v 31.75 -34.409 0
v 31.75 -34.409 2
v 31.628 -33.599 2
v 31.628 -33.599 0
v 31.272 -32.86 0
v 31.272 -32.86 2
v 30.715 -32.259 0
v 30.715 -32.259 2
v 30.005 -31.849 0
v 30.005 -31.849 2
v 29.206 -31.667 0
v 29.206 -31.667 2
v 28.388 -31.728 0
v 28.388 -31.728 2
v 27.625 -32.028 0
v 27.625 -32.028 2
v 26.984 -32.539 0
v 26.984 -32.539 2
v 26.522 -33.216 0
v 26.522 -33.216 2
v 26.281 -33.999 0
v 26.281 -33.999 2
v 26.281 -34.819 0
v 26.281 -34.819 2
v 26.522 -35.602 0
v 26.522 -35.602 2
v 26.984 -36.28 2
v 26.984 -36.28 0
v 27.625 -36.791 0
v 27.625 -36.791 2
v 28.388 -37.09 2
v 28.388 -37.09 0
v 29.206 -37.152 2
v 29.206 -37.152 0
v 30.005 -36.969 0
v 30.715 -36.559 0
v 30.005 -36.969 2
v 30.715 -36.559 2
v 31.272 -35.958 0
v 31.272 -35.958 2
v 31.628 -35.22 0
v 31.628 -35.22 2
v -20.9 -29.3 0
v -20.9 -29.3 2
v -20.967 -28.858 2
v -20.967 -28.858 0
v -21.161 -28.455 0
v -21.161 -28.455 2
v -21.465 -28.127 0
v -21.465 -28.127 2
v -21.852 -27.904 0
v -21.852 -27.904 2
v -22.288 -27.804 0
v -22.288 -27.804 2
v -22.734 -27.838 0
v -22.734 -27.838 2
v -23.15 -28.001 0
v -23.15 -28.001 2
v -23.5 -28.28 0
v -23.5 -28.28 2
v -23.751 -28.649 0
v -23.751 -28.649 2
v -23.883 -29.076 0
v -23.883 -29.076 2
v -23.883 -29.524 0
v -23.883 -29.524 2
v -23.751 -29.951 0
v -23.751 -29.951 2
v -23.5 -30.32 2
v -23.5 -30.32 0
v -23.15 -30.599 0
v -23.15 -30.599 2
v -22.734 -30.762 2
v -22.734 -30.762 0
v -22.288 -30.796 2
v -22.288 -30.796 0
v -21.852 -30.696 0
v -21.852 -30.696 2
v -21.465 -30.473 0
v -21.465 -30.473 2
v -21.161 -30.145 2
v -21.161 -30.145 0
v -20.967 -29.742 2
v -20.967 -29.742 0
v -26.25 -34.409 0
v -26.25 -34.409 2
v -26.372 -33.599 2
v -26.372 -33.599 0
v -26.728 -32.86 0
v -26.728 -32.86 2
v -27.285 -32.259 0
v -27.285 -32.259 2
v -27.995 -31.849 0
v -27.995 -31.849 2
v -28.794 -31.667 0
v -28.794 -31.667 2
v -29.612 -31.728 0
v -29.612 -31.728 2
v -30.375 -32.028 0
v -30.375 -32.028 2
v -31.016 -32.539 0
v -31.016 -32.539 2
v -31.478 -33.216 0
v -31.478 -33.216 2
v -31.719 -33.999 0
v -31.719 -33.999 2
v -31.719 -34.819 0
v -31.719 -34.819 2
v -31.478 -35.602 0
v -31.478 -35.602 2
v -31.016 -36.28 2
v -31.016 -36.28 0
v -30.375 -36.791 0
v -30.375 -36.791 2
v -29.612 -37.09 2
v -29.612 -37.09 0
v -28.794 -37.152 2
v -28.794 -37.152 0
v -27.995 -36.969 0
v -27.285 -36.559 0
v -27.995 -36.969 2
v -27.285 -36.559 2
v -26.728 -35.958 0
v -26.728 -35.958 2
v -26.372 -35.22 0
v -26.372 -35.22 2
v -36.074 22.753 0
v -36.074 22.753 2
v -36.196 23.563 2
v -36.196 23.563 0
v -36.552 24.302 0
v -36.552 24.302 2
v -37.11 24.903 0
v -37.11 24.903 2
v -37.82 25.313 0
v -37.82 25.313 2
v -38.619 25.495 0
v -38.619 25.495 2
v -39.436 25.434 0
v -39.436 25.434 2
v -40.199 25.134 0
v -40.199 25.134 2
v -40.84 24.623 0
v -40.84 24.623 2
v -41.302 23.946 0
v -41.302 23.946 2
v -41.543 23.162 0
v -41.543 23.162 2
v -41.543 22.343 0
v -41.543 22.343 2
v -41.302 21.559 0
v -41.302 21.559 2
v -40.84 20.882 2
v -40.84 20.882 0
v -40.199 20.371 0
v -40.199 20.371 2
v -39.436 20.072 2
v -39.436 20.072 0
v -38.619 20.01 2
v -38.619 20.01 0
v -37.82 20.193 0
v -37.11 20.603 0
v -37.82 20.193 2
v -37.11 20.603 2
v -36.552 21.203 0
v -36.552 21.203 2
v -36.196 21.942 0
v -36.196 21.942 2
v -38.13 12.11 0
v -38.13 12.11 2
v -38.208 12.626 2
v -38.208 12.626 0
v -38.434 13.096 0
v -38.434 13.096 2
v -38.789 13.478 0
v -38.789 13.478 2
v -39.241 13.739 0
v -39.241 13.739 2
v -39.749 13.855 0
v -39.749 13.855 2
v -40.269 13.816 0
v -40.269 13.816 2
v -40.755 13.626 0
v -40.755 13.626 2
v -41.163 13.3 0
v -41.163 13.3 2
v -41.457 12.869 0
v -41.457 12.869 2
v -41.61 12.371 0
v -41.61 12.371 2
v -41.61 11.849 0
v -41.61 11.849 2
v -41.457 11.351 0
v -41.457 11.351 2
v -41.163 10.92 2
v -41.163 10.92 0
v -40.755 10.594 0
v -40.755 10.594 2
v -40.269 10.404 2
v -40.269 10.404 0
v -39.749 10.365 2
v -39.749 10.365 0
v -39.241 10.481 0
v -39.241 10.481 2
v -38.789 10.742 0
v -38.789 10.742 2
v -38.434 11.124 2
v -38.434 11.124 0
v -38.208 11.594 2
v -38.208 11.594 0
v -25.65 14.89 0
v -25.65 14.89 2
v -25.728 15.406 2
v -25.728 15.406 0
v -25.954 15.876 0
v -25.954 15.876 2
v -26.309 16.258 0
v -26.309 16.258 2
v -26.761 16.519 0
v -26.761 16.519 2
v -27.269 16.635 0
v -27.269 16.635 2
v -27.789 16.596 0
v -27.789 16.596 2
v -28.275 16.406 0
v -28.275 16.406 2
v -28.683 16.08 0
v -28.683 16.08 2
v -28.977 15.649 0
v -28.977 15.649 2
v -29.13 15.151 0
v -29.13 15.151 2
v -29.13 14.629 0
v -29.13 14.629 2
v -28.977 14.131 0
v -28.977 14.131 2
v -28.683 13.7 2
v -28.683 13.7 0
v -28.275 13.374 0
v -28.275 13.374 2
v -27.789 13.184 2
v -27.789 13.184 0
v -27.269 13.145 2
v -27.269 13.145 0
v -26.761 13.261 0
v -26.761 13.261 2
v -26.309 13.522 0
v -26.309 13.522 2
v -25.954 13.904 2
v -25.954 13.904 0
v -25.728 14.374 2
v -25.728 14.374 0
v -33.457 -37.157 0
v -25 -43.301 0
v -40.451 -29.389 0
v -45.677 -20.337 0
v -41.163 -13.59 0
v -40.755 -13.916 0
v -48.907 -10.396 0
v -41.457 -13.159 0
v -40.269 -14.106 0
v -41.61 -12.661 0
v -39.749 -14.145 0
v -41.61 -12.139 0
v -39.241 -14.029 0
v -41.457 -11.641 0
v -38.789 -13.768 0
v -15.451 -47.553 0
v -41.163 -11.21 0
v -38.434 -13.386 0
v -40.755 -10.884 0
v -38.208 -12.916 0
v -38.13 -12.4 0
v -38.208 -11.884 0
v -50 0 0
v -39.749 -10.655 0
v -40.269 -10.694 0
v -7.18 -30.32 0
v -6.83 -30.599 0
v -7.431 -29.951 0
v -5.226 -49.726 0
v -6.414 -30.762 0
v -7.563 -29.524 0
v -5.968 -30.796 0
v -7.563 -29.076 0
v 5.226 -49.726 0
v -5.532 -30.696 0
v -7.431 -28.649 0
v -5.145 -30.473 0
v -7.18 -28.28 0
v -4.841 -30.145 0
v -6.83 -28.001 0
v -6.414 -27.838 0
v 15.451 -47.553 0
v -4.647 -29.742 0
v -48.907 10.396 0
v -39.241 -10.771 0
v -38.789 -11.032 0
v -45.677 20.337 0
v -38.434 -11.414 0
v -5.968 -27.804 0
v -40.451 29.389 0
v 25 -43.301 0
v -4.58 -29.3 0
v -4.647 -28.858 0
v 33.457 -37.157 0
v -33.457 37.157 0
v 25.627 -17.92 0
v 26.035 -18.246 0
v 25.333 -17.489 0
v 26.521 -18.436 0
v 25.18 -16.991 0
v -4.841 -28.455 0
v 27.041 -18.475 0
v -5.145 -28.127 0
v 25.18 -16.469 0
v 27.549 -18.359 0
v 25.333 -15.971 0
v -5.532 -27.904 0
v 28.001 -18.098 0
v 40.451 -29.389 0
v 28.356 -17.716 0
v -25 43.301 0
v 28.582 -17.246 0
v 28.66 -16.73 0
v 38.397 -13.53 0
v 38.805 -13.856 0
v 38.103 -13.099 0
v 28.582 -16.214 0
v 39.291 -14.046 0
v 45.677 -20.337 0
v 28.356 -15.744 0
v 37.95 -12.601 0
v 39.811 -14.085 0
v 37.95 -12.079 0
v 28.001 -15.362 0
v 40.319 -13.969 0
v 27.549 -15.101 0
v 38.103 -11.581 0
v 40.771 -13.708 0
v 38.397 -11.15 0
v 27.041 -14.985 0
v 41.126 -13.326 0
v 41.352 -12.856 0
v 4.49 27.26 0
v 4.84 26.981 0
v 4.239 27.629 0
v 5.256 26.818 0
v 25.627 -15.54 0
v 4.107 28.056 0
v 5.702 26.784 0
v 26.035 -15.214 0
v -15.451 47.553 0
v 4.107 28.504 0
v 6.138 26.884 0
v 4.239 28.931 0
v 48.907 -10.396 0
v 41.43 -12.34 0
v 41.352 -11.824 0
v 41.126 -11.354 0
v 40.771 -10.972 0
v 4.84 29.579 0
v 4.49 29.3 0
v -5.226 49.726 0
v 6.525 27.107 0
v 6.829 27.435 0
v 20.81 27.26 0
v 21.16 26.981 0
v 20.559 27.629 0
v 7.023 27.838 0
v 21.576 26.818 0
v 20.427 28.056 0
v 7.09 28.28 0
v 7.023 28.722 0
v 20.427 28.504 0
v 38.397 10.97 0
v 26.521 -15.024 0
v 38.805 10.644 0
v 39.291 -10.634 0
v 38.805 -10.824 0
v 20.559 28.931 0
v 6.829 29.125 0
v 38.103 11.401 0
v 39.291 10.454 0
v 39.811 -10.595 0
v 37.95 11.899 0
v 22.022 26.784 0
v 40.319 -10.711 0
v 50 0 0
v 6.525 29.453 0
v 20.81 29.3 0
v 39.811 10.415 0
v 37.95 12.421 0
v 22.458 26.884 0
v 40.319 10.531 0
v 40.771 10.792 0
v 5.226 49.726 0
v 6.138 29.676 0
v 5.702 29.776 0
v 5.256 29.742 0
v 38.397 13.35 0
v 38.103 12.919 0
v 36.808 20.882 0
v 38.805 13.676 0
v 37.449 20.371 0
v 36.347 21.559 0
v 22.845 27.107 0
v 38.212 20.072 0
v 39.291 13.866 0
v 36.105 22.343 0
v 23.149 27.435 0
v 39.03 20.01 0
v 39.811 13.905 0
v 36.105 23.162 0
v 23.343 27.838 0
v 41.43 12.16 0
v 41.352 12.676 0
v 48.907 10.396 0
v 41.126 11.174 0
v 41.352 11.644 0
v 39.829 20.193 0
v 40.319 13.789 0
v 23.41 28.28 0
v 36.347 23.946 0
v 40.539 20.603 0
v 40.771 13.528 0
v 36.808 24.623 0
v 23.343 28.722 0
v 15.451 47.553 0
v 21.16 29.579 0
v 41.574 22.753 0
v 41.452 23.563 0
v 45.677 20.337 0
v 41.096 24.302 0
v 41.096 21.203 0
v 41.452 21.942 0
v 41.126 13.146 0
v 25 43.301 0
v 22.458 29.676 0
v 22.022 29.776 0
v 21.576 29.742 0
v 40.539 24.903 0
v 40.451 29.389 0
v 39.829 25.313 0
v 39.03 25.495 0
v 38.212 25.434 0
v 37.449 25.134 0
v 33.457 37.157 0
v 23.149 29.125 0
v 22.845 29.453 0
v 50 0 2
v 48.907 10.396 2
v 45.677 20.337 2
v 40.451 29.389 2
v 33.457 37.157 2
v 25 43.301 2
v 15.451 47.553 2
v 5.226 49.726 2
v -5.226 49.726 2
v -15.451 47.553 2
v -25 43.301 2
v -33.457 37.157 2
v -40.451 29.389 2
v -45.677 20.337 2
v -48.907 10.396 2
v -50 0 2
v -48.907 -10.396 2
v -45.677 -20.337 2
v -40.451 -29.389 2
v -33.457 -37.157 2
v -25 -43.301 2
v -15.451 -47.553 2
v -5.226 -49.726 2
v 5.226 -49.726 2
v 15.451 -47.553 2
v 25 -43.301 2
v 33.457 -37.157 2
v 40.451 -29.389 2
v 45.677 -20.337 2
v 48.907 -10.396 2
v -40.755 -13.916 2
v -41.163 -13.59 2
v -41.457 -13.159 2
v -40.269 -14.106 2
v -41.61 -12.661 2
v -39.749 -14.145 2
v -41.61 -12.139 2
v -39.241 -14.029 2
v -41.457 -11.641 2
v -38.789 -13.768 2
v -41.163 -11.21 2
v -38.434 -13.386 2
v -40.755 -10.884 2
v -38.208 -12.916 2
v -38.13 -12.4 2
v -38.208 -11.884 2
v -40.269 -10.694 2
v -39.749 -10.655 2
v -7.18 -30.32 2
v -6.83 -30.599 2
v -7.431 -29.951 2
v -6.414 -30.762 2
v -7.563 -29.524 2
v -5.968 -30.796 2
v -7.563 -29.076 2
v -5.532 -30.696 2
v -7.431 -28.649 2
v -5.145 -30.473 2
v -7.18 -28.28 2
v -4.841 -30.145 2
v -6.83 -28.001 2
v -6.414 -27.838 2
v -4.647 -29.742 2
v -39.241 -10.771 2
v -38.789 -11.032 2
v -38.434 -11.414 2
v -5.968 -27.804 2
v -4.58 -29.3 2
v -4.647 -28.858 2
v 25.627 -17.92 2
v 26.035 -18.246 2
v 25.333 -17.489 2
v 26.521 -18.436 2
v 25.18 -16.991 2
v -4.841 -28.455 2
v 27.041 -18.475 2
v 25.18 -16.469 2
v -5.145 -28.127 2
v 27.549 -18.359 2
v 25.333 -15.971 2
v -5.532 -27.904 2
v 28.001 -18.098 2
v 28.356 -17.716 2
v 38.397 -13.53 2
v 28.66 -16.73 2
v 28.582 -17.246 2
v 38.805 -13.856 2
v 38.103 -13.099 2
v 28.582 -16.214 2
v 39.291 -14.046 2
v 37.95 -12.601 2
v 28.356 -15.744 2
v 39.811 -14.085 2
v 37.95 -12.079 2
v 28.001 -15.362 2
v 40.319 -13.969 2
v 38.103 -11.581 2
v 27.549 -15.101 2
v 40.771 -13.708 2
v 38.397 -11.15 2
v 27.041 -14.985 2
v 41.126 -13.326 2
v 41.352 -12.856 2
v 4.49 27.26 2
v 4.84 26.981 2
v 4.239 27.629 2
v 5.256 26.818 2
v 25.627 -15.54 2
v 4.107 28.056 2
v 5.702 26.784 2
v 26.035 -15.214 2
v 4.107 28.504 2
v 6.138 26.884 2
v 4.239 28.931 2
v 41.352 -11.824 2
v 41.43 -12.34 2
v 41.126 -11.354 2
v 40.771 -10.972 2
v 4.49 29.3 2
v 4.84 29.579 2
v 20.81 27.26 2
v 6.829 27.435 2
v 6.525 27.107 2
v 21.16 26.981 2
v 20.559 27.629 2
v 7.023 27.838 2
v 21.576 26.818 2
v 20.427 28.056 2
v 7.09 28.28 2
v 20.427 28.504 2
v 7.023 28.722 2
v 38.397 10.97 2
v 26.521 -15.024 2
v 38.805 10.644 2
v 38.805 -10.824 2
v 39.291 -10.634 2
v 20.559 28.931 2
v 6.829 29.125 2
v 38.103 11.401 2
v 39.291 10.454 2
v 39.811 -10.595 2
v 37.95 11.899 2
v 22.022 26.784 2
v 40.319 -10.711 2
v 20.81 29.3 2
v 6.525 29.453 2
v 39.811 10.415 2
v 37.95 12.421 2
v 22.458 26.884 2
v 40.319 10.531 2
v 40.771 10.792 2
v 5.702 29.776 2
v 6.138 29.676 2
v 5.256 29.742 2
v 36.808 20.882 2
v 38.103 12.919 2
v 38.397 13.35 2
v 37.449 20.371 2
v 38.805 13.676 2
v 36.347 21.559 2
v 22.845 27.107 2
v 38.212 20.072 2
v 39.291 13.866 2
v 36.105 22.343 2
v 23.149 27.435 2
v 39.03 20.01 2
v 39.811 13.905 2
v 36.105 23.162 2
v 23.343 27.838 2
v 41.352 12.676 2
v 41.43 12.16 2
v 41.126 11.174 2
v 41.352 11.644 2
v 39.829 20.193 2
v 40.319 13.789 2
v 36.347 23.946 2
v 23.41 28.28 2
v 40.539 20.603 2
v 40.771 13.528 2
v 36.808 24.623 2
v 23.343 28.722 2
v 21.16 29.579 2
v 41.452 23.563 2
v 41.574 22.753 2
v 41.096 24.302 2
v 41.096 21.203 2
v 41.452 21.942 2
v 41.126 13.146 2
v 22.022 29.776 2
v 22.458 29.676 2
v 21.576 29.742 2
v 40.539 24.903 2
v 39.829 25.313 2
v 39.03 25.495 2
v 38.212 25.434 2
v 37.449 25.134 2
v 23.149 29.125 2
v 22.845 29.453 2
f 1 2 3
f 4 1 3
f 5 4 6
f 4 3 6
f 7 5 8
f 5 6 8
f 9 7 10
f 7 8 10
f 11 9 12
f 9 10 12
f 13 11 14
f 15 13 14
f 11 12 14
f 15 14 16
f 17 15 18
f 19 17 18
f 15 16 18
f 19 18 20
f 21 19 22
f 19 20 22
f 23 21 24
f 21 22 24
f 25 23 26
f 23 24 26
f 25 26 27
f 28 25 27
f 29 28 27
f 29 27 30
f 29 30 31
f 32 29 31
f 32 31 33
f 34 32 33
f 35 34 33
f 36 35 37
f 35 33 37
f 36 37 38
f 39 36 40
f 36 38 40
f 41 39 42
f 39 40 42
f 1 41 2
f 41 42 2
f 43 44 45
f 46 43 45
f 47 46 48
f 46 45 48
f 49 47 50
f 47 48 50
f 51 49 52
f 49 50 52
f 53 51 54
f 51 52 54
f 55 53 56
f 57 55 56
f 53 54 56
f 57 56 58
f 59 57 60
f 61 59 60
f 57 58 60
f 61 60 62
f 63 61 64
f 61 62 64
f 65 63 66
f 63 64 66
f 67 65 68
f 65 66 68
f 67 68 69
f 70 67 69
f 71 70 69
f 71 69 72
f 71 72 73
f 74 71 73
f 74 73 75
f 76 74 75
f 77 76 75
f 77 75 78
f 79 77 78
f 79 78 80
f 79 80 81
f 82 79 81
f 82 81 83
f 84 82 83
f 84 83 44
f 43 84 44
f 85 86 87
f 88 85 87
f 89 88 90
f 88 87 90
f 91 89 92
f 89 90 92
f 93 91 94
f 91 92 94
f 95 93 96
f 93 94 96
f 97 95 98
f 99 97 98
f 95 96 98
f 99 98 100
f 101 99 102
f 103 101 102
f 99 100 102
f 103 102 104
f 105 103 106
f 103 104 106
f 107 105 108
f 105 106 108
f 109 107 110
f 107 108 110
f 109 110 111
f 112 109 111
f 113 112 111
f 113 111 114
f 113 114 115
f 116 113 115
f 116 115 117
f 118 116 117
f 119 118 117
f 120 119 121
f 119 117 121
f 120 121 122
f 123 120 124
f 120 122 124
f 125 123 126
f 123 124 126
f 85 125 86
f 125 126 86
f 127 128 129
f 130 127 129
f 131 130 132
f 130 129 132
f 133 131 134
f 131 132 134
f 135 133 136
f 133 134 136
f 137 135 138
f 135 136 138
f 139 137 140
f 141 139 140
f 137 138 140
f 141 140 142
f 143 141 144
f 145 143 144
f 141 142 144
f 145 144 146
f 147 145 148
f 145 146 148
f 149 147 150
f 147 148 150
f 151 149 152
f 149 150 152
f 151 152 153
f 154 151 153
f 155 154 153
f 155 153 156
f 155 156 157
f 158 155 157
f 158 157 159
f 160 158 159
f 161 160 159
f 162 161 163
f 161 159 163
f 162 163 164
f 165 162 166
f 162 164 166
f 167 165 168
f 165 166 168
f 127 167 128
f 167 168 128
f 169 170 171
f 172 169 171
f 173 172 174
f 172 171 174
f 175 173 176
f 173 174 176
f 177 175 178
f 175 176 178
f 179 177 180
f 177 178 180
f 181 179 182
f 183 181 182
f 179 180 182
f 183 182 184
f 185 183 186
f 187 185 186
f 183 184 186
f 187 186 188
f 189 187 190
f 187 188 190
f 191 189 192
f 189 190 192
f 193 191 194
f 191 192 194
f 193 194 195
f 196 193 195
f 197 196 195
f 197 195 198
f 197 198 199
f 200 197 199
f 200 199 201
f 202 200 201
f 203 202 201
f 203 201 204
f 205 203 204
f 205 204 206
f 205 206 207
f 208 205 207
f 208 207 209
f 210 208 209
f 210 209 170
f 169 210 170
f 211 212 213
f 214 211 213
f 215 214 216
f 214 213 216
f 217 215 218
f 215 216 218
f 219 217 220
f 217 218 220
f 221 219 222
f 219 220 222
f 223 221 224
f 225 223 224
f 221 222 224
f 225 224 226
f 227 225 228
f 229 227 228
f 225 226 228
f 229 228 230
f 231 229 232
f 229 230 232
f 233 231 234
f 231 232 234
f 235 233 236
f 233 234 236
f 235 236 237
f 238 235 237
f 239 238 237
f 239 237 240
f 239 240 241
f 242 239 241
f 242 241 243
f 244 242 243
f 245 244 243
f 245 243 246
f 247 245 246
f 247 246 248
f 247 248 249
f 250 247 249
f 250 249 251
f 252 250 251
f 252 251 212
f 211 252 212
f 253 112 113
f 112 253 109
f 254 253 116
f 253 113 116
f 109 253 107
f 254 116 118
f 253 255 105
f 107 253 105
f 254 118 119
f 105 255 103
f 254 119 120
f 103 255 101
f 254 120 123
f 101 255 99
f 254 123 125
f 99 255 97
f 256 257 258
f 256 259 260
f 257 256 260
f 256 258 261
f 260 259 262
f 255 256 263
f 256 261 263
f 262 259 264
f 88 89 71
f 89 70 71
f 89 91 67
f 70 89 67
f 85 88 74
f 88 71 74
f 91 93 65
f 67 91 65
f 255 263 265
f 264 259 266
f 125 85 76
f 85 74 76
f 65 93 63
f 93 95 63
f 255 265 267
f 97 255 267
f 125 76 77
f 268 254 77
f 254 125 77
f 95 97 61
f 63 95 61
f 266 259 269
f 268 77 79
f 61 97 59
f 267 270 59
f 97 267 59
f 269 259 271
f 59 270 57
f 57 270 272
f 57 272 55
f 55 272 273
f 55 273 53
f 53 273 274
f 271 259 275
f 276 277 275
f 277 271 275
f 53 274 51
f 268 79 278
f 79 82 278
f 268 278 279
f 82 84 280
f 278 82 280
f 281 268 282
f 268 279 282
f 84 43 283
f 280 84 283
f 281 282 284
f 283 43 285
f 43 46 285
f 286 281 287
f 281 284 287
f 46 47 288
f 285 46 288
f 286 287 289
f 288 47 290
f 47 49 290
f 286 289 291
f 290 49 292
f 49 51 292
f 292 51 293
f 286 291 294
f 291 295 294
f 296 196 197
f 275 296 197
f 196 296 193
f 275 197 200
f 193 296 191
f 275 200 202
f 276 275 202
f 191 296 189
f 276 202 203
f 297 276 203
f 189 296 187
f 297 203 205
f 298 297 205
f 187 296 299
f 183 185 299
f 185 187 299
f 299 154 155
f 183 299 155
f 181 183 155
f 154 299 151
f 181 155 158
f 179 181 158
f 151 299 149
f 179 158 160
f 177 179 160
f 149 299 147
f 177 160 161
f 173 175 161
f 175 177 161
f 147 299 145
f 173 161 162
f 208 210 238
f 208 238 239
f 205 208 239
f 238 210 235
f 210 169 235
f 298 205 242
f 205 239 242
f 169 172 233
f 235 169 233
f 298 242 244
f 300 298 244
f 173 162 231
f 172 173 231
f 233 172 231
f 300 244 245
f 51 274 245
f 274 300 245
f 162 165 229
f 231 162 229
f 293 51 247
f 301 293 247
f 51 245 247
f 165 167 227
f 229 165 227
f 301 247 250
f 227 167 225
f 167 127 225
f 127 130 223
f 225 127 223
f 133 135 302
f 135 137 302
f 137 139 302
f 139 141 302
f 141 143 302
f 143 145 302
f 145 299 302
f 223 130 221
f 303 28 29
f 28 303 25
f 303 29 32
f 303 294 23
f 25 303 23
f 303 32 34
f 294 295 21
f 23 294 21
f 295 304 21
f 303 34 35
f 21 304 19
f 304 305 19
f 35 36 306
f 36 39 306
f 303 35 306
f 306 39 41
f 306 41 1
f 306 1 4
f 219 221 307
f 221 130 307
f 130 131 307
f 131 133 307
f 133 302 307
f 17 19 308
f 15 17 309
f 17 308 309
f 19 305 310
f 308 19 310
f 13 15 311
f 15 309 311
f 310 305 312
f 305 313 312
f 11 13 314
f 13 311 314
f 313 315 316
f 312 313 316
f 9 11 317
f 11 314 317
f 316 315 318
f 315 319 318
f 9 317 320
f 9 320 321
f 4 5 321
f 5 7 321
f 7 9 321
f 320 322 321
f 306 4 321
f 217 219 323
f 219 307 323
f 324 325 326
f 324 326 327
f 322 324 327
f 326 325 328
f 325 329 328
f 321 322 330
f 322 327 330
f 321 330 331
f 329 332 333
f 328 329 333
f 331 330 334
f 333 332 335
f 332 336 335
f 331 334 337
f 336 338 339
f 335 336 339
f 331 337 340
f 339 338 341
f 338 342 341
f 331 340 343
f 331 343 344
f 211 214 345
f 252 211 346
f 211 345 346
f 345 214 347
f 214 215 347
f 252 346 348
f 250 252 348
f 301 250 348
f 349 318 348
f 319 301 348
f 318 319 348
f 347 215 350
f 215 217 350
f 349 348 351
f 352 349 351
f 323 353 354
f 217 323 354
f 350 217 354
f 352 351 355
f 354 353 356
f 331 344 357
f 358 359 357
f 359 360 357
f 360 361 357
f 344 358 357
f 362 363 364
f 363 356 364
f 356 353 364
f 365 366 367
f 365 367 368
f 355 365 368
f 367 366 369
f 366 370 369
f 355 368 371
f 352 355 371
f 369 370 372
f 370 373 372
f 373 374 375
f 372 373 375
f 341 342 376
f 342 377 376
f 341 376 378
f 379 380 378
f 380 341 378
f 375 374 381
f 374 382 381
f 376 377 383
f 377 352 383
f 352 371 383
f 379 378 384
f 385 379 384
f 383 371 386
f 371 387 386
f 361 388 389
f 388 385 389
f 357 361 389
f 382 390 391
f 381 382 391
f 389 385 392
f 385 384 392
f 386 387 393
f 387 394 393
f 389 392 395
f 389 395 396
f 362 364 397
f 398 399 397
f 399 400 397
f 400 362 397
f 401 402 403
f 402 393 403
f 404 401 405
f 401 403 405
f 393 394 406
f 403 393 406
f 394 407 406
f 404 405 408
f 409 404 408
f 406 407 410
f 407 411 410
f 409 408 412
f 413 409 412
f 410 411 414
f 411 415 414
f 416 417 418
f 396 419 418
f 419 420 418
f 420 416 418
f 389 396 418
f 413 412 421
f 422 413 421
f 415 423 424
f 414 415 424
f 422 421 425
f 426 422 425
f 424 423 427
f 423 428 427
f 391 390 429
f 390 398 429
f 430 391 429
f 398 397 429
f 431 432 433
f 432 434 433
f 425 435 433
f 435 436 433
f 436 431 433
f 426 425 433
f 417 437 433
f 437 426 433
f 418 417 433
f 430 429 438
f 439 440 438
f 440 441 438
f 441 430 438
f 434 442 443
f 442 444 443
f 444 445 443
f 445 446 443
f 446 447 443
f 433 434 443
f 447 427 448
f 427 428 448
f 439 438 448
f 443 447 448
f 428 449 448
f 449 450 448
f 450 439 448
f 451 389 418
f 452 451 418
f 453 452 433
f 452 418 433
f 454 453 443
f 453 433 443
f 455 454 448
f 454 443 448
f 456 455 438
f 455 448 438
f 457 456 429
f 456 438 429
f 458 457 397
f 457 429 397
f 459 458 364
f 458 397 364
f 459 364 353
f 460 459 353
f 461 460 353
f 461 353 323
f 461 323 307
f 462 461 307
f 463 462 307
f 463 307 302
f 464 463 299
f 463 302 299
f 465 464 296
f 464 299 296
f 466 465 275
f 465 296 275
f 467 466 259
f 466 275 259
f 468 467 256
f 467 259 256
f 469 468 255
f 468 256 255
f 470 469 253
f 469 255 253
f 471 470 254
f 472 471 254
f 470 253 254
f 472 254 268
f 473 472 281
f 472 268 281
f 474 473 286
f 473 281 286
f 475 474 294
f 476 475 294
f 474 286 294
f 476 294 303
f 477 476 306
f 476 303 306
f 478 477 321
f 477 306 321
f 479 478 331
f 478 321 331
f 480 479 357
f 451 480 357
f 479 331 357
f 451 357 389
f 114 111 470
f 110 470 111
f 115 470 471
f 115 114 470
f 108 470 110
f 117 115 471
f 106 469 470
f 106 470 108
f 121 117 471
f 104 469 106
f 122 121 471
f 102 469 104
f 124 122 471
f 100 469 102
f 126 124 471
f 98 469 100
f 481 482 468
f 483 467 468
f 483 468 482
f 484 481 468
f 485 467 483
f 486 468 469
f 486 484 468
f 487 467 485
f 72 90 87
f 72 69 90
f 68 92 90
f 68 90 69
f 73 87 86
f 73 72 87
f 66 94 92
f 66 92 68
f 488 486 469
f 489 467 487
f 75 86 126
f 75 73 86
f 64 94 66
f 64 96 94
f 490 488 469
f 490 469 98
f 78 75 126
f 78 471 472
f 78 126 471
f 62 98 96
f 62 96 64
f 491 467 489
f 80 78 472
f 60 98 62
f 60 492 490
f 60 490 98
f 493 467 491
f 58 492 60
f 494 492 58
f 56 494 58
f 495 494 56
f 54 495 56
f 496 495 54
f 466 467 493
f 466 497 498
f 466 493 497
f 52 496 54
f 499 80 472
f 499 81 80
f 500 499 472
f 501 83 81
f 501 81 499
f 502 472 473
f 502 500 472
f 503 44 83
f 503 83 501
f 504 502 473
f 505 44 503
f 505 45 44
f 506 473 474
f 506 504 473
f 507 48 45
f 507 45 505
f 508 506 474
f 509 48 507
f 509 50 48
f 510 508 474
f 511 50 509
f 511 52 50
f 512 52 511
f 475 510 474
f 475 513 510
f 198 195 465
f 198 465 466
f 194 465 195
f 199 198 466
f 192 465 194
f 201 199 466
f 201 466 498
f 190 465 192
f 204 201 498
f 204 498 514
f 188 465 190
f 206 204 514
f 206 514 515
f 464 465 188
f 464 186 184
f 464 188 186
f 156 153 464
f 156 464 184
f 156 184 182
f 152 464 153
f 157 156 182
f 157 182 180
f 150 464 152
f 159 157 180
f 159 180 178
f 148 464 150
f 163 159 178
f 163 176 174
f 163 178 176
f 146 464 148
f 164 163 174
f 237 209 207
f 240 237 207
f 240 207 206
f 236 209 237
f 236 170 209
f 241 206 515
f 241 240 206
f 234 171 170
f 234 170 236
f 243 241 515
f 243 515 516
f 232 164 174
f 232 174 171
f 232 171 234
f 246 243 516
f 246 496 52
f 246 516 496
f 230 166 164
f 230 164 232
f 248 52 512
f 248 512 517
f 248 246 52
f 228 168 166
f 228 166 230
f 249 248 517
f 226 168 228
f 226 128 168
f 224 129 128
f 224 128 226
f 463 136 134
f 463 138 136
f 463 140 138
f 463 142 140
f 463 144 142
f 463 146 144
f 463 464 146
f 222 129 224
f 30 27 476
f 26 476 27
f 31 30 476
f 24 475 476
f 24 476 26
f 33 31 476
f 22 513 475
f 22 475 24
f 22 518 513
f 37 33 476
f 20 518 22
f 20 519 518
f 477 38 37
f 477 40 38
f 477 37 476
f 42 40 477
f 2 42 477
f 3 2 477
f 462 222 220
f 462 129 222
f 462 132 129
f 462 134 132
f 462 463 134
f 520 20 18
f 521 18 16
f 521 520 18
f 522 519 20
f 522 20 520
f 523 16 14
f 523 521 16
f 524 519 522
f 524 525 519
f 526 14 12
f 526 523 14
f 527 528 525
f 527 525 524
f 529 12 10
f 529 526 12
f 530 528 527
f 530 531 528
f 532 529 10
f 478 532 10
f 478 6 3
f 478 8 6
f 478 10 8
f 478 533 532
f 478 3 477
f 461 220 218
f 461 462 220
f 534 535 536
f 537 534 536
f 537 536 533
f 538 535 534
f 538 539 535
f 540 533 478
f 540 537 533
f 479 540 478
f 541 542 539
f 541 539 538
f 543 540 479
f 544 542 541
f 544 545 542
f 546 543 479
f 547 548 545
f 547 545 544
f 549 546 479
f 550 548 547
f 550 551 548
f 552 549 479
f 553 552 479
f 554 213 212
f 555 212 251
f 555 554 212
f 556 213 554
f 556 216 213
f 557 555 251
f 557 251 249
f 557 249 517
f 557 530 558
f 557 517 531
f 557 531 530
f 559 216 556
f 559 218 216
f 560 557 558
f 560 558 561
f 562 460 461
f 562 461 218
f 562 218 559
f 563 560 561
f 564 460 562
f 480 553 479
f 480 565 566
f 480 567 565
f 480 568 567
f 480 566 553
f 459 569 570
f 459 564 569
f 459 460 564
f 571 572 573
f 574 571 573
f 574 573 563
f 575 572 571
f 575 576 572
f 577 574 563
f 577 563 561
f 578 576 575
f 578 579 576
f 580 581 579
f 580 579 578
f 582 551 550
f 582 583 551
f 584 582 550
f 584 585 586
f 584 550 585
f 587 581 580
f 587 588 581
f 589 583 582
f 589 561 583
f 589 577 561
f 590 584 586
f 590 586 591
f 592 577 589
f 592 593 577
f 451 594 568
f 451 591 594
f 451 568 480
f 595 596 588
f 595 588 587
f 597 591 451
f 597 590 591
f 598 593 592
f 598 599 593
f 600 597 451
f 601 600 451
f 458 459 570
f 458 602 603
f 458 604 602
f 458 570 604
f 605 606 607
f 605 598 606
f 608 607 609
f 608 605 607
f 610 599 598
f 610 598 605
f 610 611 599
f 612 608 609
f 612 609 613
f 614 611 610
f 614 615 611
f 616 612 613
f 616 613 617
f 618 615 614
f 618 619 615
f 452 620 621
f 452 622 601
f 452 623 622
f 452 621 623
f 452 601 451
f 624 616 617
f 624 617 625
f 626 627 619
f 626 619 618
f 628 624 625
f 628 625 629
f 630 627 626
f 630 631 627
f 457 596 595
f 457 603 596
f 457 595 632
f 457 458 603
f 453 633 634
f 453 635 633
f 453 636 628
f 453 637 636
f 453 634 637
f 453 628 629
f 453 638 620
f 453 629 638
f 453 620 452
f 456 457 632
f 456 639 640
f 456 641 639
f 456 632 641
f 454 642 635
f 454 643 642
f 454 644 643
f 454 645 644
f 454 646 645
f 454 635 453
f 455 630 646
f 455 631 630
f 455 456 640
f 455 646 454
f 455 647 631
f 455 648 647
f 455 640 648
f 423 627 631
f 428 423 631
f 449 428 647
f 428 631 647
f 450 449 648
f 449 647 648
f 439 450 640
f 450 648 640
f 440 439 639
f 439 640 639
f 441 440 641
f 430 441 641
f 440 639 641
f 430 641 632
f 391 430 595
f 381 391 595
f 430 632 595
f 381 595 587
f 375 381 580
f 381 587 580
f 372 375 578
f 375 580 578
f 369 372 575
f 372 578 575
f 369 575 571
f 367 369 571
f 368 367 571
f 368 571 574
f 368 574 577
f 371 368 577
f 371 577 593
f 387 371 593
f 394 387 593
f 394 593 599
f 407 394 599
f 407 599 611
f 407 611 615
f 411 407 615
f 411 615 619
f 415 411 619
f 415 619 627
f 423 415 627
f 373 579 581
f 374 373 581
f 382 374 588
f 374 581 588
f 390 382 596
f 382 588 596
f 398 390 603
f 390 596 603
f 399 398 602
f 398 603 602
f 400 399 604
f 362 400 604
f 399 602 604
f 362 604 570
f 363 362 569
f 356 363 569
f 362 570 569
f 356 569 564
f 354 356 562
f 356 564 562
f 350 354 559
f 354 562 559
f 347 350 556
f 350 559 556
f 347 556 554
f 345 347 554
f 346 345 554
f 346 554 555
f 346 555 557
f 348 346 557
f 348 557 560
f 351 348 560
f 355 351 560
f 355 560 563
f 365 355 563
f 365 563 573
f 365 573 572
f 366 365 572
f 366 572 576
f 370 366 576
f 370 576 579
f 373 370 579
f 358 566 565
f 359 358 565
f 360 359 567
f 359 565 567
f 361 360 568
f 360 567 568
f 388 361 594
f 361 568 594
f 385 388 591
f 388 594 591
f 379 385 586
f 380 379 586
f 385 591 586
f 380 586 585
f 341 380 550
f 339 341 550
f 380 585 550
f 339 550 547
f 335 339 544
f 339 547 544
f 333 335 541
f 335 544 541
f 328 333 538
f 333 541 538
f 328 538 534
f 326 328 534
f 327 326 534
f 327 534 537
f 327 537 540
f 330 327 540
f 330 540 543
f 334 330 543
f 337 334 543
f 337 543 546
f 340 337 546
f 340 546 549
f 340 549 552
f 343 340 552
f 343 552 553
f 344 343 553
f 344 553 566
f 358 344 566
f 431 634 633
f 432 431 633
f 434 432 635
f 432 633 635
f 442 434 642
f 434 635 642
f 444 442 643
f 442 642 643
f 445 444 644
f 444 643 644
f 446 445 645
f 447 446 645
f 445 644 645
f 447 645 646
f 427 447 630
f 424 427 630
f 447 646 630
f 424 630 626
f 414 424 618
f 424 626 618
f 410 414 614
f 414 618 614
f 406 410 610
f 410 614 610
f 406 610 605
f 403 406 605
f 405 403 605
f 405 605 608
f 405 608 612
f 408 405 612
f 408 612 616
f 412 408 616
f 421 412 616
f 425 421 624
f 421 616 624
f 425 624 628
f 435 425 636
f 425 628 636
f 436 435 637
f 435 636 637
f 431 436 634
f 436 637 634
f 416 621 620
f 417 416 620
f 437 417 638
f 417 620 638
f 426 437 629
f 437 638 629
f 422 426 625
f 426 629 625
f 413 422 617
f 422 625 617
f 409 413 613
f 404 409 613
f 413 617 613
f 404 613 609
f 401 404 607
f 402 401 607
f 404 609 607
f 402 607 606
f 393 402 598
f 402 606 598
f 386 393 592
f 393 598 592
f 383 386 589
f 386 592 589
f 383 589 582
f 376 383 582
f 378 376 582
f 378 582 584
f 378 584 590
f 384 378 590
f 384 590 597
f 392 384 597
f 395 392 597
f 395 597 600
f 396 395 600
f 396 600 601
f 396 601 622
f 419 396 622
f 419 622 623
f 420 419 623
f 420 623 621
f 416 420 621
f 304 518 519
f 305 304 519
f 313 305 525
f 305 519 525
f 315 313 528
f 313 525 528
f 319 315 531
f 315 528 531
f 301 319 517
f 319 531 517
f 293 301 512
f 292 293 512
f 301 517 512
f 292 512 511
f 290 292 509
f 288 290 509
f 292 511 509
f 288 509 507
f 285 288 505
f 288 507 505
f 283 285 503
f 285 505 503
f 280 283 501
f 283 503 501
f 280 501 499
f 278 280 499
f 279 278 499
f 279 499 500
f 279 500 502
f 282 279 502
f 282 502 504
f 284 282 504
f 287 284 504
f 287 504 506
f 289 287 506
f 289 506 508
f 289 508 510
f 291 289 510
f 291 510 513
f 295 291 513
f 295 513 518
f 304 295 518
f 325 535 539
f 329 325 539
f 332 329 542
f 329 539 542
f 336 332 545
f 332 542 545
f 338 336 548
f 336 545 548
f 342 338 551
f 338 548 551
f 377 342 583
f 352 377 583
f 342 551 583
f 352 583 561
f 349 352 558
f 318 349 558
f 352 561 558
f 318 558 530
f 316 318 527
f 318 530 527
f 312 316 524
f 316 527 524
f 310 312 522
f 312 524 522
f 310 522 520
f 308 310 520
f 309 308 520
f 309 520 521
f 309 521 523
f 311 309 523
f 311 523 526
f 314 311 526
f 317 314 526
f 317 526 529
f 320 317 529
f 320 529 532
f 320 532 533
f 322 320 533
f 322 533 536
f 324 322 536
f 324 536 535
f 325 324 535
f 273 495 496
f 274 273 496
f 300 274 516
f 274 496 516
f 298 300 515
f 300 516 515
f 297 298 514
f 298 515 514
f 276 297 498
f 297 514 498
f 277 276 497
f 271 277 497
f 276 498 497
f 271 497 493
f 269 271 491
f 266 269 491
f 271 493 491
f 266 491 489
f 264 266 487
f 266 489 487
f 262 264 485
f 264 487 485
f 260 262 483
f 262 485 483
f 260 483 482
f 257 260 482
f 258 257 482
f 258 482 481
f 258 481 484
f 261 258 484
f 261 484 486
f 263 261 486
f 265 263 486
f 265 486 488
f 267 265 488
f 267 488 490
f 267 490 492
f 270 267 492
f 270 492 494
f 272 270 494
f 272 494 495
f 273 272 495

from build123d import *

# Parameters (mm, degrees)
ESBO_O1_R                = 50
RESSALTO_EXTRUS_O1_DEPTH = 2
ESBO_O2_R                = 2.75
CORTE_EXTRUS_O1_DEPTH    = 2
ESBO_O3_R                = 1.75
ESBO_O3_R_2              = 1.5
CORTE_EXTRUS_O2_DEPTH    = 10


with BuildPart() as part:
    # Esboço1 → Ressalto-extrusão1 (new body)
    with BuildSketch(Plane.XY):
        Circle(ESBO_O1_R)
    extrude(amount=RESSALTO_EXTRUS_O1_DEPTH)

    # Esboço2 → Corte-extrusão1 (cut)
    with BuildSketch(Plane.XY.offset(2)):
        with Locations((-29, -34.409301068)):
            Circle(ESBO_O2_R)
        with Locations((29, -34.409301068)):
            Circle(ESBO_O2_R)
        with Locations((-38.824197531, 22.752619324)):
            Circle(ESBO_O2_R)
        with Locations((38.824197531, 22.752619324)):
            Circle(ESBO_O2_R)
    extrude(amount=-CORTE_EXTRUS_O1_DEPTH, mode=Mode.SUBTRACT)

    # Esboço3 → Corte-extrusão2 (cut)
    with BuildSketch(Plane.XY.offset(2)):
        with Locations((-27.4, 14.89)):
            Circle(ESBO_O3_R)
        with Locations((26.91, -16.73)):
            Circle(ESBO_O3_R)
        with Locations((-39.88, -12.4)):
            Circle(ESBO_O3_R)
        with Locations((-39.88, 12.11)):
            Circle(ESBO_O3_R)
        with Locations((39.68, 12.16)):
            Circle(ESBO_O3_R)
        with Locations((39.68, -12.34)):
            Circle(ESBO_O3_R)
        with Locations((5.59, 28.28)):
            Circle(ESBO_O3_R_2)
        with Locations((21.91, 28.28)):
            Circle(ESBO_O3_R_2)
        with Locations((-6.08, -29.3)):
            Circle(ESBO_O3_R_2)
        with Locations((-22.4, -29.3)):
            Circle(ESBO_O3_R_2)
    extrude(amount=-CORTE_EXTRUS_O2_DEPTH, mode=Mode.SUBTRACT)


solid = part.part
